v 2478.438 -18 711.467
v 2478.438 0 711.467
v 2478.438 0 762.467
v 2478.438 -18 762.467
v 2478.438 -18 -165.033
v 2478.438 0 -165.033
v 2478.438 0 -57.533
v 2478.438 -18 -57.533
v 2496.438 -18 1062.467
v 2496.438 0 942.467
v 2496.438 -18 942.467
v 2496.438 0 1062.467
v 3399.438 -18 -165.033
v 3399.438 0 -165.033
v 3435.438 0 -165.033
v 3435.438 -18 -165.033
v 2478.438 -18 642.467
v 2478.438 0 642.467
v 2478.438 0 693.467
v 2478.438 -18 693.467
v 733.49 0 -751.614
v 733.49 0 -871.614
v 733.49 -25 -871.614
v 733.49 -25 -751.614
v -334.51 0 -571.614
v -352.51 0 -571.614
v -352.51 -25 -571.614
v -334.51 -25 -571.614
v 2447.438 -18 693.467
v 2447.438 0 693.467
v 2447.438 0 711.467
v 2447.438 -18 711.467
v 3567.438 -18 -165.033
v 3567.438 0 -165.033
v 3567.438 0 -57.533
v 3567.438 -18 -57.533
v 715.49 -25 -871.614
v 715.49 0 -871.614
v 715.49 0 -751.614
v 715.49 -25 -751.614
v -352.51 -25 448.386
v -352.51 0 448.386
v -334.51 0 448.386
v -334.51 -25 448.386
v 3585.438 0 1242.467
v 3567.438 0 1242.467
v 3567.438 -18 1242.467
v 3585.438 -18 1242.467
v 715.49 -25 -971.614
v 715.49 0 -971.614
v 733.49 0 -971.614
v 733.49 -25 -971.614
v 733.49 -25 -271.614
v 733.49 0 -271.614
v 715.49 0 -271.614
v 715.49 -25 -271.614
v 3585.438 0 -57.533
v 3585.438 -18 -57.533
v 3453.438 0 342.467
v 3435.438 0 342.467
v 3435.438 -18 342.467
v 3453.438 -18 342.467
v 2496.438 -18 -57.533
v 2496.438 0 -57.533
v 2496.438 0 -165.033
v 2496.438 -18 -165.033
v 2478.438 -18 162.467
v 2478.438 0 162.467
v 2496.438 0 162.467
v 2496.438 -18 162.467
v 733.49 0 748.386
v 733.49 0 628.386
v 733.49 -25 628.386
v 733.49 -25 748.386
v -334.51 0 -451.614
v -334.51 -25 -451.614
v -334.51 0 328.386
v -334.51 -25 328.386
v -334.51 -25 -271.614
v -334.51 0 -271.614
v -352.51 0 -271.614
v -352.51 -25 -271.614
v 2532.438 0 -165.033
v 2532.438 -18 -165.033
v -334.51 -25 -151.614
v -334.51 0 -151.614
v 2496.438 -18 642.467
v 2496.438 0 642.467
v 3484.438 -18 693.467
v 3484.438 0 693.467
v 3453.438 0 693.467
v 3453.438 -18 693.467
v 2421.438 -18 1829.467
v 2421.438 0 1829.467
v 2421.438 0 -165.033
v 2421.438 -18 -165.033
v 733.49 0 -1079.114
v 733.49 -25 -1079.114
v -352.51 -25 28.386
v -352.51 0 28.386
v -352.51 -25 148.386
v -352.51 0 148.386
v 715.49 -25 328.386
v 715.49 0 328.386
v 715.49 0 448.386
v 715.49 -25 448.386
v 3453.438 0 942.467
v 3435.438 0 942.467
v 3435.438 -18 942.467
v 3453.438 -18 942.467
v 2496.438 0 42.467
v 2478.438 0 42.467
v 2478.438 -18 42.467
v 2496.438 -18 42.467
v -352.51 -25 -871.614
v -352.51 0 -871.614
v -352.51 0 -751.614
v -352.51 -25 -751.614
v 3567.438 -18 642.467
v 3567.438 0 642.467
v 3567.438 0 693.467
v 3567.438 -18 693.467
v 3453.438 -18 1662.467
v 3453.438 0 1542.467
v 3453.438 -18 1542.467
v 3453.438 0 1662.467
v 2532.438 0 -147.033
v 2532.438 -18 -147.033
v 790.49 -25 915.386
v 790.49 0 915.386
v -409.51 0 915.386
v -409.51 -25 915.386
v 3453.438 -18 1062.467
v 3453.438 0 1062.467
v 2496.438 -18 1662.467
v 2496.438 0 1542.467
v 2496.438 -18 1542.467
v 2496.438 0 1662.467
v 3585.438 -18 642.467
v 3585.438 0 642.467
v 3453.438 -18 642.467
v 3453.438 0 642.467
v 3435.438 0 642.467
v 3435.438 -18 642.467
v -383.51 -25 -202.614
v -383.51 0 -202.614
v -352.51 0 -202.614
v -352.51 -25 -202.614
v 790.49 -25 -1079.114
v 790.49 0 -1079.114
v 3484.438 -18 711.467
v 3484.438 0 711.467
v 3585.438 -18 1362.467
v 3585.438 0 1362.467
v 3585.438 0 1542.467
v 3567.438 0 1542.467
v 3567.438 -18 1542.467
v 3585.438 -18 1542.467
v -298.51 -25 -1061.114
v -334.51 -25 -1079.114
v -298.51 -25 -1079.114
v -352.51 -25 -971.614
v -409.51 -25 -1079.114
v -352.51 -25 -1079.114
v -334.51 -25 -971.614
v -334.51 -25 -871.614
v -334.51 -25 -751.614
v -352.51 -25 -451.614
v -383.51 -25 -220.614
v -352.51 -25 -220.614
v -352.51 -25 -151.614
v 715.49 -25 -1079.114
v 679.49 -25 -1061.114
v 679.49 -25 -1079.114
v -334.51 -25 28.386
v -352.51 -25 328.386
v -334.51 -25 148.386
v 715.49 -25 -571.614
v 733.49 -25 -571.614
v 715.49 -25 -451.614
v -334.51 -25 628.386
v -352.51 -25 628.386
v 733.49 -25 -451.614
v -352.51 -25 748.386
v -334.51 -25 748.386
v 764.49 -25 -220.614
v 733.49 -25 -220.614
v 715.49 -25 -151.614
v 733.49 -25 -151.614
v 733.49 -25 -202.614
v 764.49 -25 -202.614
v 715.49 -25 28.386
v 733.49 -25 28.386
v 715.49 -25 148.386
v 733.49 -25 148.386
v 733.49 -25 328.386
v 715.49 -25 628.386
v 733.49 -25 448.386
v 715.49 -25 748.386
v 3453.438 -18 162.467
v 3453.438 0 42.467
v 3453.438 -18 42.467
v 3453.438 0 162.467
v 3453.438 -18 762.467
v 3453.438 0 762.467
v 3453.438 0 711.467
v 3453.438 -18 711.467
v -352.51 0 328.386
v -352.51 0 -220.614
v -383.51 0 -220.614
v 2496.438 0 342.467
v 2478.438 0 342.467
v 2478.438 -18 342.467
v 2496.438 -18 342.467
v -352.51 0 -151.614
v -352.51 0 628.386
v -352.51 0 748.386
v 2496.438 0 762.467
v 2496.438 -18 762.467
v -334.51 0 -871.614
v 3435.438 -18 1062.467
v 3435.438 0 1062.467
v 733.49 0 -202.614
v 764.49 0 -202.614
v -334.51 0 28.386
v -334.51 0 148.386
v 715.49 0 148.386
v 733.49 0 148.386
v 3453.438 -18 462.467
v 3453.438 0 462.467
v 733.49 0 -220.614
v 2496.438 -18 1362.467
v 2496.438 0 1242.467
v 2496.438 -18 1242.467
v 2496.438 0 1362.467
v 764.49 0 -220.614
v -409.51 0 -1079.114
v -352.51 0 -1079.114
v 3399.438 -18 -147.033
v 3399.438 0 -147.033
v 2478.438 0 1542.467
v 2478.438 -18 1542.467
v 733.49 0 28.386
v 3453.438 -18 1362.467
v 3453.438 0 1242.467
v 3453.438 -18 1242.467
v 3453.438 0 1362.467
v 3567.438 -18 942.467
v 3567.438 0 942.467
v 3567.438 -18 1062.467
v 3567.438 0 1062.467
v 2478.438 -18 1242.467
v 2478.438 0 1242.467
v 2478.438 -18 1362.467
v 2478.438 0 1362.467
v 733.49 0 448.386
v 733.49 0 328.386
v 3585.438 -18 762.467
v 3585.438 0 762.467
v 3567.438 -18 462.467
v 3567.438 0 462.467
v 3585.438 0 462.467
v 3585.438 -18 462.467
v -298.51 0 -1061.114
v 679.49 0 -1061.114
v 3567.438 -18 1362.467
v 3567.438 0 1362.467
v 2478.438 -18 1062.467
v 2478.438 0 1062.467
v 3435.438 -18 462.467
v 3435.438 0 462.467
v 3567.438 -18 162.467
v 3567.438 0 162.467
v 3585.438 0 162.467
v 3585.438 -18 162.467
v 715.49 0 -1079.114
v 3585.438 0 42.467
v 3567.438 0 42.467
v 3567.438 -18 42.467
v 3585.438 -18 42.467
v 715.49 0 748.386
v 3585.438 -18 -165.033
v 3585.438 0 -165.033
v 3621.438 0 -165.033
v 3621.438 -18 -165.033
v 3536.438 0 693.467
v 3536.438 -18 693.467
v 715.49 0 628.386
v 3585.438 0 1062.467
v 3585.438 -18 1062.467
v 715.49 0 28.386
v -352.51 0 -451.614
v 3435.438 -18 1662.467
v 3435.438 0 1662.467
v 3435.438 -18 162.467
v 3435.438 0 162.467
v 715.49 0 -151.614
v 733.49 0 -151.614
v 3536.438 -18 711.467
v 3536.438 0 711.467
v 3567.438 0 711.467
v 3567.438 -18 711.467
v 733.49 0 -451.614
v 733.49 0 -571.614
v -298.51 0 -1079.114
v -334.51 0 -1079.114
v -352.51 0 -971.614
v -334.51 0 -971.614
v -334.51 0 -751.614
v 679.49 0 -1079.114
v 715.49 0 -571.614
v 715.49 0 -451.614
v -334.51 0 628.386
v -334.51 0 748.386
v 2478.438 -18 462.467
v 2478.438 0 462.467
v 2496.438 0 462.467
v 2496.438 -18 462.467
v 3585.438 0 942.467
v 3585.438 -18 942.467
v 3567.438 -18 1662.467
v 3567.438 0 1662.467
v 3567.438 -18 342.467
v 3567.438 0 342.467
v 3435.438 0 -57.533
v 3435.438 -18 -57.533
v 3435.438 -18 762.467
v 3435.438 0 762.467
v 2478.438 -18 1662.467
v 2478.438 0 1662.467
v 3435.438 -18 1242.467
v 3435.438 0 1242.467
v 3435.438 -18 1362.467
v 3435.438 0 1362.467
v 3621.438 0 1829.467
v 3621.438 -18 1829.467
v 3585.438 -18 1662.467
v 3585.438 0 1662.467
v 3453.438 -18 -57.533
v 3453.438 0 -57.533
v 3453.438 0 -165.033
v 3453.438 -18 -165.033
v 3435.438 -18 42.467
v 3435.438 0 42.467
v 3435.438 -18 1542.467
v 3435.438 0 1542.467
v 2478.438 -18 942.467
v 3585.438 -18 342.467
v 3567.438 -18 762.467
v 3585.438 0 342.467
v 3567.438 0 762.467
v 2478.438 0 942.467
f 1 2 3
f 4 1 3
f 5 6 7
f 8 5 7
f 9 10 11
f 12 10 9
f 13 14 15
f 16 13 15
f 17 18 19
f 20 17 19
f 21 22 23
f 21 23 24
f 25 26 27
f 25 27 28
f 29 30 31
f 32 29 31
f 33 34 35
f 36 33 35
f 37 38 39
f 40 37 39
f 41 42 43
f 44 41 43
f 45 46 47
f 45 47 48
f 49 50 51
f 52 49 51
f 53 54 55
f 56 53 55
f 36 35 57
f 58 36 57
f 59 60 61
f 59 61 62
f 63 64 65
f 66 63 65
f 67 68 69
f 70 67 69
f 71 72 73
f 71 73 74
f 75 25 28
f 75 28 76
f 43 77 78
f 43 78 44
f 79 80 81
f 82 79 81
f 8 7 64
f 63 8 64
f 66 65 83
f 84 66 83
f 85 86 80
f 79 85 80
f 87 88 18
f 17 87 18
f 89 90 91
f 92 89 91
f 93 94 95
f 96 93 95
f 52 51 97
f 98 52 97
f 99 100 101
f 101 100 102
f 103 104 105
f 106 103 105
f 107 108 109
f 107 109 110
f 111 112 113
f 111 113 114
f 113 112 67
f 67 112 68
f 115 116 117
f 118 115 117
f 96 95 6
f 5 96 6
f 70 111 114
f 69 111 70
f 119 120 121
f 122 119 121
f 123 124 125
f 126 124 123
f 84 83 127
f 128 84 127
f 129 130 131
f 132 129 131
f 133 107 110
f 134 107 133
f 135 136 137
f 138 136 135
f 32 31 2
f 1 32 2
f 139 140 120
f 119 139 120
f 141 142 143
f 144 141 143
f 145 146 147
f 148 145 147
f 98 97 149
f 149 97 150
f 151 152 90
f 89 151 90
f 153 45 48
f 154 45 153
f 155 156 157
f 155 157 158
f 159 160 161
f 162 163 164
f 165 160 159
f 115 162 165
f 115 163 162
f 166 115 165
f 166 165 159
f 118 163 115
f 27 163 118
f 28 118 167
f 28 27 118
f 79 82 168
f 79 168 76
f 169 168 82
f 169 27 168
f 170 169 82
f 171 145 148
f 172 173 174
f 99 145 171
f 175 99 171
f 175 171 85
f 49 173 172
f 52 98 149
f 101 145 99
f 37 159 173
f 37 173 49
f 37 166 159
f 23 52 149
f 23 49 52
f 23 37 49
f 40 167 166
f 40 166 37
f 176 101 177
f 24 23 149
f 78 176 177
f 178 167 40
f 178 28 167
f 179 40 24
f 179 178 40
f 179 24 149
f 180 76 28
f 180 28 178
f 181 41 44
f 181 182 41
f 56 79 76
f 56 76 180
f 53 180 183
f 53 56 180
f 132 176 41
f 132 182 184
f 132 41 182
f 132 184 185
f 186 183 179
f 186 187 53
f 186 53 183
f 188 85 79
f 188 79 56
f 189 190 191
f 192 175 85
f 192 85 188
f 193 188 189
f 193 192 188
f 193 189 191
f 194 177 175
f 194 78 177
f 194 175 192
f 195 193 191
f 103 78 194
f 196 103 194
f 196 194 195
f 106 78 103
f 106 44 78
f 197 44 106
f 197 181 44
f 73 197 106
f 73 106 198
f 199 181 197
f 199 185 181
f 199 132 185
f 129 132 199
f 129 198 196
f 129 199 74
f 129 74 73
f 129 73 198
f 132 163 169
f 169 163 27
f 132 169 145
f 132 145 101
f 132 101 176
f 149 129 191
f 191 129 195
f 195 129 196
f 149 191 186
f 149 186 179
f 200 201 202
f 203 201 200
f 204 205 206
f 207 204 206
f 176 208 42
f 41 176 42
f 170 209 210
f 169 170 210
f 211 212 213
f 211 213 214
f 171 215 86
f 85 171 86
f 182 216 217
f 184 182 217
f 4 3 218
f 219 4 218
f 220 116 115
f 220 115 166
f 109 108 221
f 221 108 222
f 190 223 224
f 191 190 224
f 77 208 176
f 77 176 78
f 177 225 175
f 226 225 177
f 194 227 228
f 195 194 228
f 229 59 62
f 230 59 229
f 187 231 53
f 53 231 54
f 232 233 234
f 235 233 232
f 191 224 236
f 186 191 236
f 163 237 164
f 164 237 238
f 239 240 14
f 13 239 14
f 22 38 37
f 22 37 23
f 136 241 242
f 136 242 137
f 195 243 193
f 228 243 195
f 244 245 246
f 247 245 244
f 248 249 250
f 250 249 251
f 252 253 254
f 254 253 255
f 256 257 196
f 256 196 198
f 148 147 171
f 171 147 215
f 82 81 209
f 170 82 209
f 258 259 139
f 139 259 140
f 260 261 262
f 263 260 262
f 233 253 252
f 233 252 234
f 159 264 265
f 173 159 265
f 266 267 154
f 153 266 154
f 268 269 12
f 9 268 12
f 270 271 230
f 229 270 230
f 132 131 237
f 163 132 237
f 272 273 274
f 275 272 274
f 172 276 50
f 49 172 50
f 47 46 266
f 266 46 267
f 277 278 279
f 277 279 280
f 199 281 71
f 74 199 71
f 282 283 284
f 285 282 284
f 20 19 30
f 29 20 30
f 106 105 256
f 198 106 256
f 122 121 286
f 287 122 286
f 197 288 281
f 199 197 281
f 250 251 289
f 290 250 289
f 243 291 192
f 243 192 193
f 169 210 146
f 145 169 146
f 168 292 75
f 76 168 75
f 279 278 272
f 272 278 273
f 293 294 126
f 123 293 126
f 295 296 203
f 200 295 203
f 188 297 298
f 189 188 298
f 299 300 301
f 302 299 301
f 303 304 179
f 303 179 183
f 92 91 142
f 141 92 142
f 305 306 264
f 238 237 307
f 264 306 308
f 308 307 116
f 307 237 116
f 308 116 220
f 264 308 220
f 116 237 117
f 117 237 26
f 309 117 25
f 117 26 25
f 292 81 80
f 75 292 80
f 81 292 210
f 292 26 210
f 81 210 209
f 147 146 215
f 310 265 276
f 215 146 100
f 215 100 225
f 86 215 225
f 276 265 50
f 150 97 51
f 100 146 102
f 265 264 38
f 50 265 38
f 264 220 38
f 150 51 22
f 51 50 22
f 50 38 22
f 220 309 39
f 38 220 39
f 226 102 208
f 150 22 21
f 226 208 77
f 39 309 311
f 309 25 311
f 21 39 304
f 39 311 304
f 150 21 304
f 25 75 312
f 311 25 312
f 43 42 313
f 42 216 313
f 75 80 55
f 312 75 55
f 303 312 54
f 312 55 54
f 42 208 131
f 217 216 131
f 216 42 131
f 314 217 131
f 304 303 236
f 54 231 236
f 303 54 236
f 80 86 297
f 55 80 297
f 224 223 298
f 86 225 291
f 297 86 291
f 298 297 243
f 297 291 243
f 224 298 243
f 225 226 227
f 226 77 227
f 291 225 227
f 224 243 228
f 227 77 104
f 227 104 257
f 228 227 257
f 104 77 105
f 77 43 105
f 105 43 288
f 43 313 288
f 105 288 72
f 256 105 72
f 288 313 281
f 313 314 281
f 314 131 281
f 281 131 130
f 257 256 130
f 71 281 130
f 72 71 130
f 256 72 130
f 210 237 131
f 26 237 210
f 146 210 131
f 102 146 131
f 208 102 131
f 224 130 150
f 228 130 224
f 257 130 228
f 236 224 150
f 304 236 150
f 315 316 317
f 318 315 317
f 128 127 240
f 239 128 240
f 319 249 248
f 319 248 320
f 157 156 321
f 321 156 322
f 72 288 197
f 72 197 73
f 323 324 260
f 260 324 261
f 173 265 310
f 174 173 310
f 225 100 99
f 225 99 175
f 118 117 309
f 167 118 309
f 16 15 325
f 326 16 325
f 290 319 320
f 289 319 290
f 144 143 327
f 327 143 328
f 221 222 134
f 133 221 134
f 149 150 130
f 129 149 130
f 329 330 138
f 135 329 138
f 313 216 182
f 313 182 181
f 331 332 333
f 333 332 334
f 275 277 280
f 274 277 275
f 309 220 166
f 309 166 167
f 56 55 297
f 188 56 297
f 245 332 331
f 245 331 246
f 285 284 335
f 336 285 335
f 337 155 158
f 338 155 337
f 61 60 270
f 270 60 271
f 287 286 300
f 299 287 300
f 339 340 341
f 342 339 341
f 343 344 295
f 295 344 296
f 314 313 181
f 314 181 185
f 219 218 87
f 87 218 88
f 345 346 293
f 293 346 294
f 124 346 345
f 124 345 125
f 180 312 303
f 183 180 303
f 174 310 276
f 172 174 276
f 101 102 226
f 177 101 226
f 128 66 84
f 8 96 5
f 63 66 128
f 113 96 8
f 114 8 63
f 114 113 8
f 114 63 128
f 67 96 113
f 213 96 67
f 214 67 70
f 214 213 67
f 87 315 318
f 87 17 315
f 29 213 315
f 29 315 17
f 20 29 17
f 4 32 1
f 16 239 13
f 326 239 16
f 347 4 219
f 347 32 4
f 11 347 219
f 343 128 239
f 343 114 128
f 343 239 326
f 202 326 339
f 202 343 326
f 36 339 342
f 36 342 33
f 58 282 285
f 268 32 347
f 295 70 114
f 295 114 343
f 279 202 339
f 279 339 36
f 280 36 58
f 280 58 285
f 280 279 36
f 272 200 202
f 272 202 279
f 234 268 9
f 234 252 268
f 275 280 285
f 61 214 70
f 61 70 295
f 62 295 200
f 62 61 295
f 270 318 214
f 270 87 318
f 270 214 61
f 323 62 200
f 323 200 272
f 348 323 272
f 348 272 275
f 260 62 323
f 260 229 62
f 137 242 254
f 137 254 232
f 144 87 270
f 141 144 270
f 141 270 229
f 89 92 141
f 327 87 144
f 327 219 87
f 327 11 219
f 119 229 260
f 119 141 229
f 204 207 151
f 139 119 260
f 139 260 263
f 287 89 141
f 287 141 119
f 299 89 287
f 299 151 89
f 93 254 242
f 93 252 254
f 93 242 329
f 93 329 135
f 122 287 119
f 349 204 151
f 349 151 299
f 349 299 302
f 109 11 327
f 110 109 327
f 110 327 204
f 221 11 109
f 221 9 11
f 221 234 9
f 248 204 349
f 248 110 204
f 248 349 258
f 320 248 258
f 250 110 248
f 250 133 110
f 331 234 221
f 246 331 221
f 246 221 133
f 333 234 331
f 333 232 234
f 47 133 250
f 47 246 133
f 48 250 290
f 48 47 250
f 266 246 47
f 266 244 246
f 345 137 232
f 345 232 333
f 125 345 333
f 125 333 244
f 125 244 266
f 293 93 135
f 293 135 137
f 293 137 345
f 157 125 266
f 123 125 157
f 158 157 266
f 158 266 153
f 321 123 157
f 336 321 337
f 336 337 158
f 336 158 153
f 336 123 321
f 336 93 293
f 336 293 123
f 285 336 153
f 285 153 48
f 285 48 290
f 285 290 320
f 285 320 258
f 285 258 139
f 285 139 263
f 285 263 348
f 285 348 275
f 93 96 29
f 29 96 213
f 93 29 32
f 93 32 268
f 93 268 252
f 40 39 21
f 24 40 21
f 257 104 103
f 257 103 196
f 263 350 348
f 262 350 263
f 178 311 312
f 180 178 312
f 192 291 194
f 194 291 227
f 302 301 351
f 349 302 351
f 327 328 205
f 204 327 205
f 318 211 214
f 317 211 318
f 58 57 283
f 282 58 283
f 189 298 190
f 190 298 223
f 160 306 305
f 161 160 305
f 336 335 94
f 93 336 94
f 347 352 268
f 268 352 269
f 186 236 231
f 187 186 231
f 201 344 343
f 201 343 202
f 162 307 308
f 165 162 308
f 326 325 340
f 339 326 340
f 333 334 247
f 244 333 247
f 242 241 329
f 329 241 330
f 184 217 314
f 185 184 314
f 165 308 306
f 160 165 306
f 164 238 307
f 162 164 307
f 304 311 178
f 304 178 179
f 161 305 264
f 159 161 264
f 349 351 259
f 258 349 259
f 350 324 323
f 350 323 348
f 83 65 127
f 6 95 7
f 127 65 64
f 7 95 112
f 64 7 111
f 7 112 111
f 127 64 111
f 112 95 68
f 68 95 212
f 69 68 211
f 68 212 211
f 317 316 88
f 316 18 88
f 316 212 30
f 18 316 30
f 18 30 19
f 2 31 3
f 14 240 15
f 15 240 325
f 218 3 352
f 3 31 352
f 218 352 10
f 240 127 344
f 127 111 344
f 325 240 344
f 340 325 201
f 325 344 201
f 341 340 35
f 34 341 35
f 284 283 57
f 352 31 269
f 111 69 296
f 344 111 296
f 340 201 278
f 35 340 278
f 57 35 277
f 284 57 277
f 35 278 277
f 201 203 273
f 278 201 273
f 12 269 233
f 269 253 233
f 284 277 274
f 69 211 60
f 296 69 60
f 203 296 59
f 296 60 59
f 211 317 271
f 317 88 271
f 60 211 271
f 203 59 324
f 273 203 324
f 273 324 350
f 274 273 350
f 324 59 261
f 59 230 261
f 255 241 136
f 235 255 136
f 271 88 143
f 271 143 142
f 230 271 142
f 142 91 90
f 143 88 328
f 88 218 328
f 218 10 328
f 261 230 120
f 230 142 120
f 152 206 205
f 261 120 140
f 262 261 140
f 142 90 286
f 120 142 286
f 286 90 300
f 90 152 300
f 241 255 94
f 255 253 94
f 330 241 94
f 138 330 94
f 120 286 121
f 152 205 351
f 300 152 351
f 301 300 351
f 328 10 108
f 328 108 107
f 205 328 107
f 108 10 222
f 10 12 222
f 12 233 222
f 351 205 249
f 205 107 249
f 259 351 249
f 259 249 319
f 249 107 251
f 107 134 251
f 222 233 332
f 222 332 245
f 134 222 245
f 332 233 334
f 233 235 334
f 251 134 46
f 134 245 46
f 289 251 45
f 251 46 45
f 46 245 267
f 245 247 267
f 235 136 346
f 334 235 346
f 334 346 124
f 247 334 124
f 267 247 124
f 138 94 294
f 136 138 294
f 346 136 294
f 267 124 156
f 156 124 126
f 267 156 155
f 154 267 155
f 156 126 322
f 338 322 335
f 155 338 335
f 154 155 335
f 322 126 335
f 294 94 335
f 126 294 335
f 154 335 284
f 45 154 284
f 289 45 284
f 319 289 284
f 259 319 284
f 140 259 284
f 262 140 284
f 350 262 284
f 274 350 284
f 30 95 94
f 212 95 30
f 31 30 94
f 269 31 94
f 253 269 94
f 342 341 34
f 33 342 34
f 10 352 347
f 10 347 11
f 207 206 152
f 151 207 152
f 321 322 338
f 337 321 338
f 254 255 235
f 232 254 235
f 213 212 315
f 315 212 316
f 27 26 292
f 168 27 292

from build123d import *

# Parameters (mm, degrees)
F0_W     = 18
F0_H     = 120
F2_DEPTH = 25
F1_W     = 18
F1_H     = 120
F3_DEPTH = 18


with BuildPart() as f2:
    # F0 (on Front) → F2 (new body)
    with BuildSketch(Plane.XZ):
        Polygon((715.490359, 915.3857), (-334.509641, 915.3857), (-352.509641, 915.3857), (-409.509641, 915.3857), (-409.509641, -1079.1143), (-352.509641, -1079.1143), (-352.509641, -971.6143), (-334.509641, -971.6143), (-334.509641, -1079.1143), (-298.509641, -1079.1143), (-298.509641, -1061.1143), (190.490359, -1061.1143), (679.490359, -1061.1143), (679.490359, -1079.1143), (715.490359, -1079.1143), (715.490359, -971.6143), (733.490359, -971.6143), (733.490359, -1079.1143), (790.490359, -1079.1143), (790.490359, 915.3857), (733.490359, 915.3857), align=None)
        with Locations((-343.509641, -811.6143)):
            Rectangle(F0_W, F0_H, mode=Mode.SUBTRACT)
        with Locations((-343.509641, -511.6143)):
            Rectangle(F0_W, F0_H, mode=Mode.SUBTRACT)
        Polygon((-383.509641, -220.6143), (-383.509641, -202.6143), (-352.509641, -202.6143), (-352.509641, -151.6143), (-334.509641, -151.6143), (-334.509641, -211.6143), (-334.509641, -271.6143), (-352.509641, -271.6143), (-352.509641, -220.6143), align=None, mode=Mode.SUBTRACT)
        with Locations((724.490359, -811.6143)):
            Rectangle(F0_W, F0_H, mode=Mode.SUBTRACT)
        with Locations((724.490359, -511.6143)):
            Rectangle(F0_W, F0_H, mode=Mode.SUBTRACT)
        Polygon((715.490359, -271.6143), (715.490359, -211.6143), (715.490359, -151.6143), (733.490359, -151.6143), (733.490359, -202.6143), (764.490359, -202.6143), (764.490359, -220.6143), (733.490359, -220.6143), (733.490359, -271.6143), align=None, mode=Mode.SUBTRACT)
        with Locations((-343.509641, 88.3857)):
            Rectangle(F0_W, F0_H, mode=Mode.SUBTRACT)
        with Locations((-343.509641, 388.3857)):
            Rectangle(F0_W, F0_H, mode=Mode.SUBTRACT)
        with Locations((-343.509641, 688.3857)):
            Rectangle(F0_W, F0_H, mode=Mode.SUBTRACT)
        with Locations((724.490359, 88.3857)):
            Rectangle(F0_W, F0_H, mode=Mode.SUBTRACT)
        with Locations((724.490359, 388.3857)):
            Rectangle(F0_W, F0_H, mode=Mode.SUBTRACT)
        with Locations((724.490359, 688.3857)):
            Rectangle(F0_W, F0_H, mode=Mode.SUBTRACT)
    extrude(amount=F2_DEPTH)


with BuildPart() as f3:
    # F1 (on Front) → F3 (new body)
    with BuildSketch(Plane.XZ):
        Polygon((2478.43837, -165.032655), (2478.43837, -57.532655), (2496.43837, -57.532655), (2496.43837, -165.032655), (2532.43837, -165.032655), (2532.43837, -147.032655), (2965.93837, -147.032655), (3399.43837, -147.032655), (3399.43837, -165.032655), (3435.43837, -165.032655), (3435.43837, -57.532655), (3453.43837, -57.532655), (3453.43837, -165.032655), (3510.43837, -165.032655), (3567.43837, -165.032655), (3567.43837, -57.532655), (3585.43837, -57.532655), (3585.43837, -165.032655), (3621.43837, -165.032655), (3621.43837, -147.032655), (3621.43837, 1829.467345), (3585.43837, 1829.467345), (3567.43837, 1829.467345), (3453.43837, 1829.467345), (3435.43837, 1829.467345), (2496.43837, 1829.467345), (2478.43837, 1829.467345), (2421.43837, 1829.467345), (2421.43837, -165.032655), align=None)
        with Locations((2487.43837, 102.467345)):
            Rectangle(F1_W, F1_H, mode=Mode.SUBTRACT)
        with Locations((2487.43837, 402.467345)):
            Rectangle(F1_W, F1_H, mode=Mode.SUBTRACT)
        Polygon((2447.43837, 693.467345), (2447.43837, 711.467345), (2478.43837, 711.467345), (2478.43837, 762.467345), (2496.43837, 762.467345), (2496.43837, 642.467345), (2478.43837, 642.467345), (2478.43837, 693.467345), align=None, mode=Mode.SUBTRACT)
        with Locations((3444.43837, 102.467345)):
            Rectangle(F1_W, F1_H, mode=Mode.SUBTRACT)
        with Locations((3576.43837, 102.467345)):
            Rectangle(F1_W, F1_H, mode=Mode.SUBTRACT)
        with Locations((3444.43837, 402.467345)):
            Rectangle(F1_W, F1_H, mode=Mode.SUBTRACT)
        with Locations((3576.43837, 402.467345)):
            Rectangle(F1_W, F1_H, mode=Mode.SUBTRACT)
        Polygon((3453.43837, 693.467345), (3453.43837, 642.467345), (3435.43837, 642.467345), (3435.43837, 762.467345), (3453.43837, 762.467345), (3453.43837, 711.467345), (3484.43837, 711.467345), (3484.43837, 693.467345), align=None, mode=Mode.SUBTRACT)
        Polygon((3585.43837, 642.467345), (3567.43837, 642.467345), (3567.43837, 693.467345), (3536.43837, 693.467345), (3536.43837, 711.467345), (3567.43837, 711.467345), (3567.43837, 762.467345), (3585.43837, 762.467345), align=None, mode=Mode.SUBTRACT)
        with Locations((2487.43837, 1002.467345)):
            Rectangle(F1_W, F1_H, mode=Mode.SUBTRACT)
        with Locations((2487.43837, 1302.467345)):
            Rectangle(F1_W, F1_H, mode=Mode.SUBTRACT)
        with Locations((2487.43837, 1602.467345)):
            Rectangle(F1_W, F1_H, mode=Mode.SUBTRACT)
        with Locations((3444.43837, 1002.467345)):
            Rectangle(F1_W, F1_H, mode=Mode.SUBTRACT)
        with Locations((3576.43837, 1002.467345)):
            Rectangle(F1_W, F1_H, mode=Mode.SUBTRACT)
        with Locations((3444.43837, 1302.467345)):
            Rectangle(F1_W, F1_H, mode=Mode.SUBTRACT)
        with Locations((3576.43837, 1302.467345)):
            Rectangle(F1_W, F1_H, mode=Mode.SUBTRACT)
        with Locations((3444.43837, 1602.467345)):
            Rectangle(F1_W, F1_H, mode=Mode.SUBTRACT)
        with Locations((3576.43837, 1602.467345)):
            Rectangle(F1_W, F1_H, mode=Mode.SUBTRACT)
    extrude(amount=F3_DEPTH)


solid = Compound([f2.part, f3.part])
